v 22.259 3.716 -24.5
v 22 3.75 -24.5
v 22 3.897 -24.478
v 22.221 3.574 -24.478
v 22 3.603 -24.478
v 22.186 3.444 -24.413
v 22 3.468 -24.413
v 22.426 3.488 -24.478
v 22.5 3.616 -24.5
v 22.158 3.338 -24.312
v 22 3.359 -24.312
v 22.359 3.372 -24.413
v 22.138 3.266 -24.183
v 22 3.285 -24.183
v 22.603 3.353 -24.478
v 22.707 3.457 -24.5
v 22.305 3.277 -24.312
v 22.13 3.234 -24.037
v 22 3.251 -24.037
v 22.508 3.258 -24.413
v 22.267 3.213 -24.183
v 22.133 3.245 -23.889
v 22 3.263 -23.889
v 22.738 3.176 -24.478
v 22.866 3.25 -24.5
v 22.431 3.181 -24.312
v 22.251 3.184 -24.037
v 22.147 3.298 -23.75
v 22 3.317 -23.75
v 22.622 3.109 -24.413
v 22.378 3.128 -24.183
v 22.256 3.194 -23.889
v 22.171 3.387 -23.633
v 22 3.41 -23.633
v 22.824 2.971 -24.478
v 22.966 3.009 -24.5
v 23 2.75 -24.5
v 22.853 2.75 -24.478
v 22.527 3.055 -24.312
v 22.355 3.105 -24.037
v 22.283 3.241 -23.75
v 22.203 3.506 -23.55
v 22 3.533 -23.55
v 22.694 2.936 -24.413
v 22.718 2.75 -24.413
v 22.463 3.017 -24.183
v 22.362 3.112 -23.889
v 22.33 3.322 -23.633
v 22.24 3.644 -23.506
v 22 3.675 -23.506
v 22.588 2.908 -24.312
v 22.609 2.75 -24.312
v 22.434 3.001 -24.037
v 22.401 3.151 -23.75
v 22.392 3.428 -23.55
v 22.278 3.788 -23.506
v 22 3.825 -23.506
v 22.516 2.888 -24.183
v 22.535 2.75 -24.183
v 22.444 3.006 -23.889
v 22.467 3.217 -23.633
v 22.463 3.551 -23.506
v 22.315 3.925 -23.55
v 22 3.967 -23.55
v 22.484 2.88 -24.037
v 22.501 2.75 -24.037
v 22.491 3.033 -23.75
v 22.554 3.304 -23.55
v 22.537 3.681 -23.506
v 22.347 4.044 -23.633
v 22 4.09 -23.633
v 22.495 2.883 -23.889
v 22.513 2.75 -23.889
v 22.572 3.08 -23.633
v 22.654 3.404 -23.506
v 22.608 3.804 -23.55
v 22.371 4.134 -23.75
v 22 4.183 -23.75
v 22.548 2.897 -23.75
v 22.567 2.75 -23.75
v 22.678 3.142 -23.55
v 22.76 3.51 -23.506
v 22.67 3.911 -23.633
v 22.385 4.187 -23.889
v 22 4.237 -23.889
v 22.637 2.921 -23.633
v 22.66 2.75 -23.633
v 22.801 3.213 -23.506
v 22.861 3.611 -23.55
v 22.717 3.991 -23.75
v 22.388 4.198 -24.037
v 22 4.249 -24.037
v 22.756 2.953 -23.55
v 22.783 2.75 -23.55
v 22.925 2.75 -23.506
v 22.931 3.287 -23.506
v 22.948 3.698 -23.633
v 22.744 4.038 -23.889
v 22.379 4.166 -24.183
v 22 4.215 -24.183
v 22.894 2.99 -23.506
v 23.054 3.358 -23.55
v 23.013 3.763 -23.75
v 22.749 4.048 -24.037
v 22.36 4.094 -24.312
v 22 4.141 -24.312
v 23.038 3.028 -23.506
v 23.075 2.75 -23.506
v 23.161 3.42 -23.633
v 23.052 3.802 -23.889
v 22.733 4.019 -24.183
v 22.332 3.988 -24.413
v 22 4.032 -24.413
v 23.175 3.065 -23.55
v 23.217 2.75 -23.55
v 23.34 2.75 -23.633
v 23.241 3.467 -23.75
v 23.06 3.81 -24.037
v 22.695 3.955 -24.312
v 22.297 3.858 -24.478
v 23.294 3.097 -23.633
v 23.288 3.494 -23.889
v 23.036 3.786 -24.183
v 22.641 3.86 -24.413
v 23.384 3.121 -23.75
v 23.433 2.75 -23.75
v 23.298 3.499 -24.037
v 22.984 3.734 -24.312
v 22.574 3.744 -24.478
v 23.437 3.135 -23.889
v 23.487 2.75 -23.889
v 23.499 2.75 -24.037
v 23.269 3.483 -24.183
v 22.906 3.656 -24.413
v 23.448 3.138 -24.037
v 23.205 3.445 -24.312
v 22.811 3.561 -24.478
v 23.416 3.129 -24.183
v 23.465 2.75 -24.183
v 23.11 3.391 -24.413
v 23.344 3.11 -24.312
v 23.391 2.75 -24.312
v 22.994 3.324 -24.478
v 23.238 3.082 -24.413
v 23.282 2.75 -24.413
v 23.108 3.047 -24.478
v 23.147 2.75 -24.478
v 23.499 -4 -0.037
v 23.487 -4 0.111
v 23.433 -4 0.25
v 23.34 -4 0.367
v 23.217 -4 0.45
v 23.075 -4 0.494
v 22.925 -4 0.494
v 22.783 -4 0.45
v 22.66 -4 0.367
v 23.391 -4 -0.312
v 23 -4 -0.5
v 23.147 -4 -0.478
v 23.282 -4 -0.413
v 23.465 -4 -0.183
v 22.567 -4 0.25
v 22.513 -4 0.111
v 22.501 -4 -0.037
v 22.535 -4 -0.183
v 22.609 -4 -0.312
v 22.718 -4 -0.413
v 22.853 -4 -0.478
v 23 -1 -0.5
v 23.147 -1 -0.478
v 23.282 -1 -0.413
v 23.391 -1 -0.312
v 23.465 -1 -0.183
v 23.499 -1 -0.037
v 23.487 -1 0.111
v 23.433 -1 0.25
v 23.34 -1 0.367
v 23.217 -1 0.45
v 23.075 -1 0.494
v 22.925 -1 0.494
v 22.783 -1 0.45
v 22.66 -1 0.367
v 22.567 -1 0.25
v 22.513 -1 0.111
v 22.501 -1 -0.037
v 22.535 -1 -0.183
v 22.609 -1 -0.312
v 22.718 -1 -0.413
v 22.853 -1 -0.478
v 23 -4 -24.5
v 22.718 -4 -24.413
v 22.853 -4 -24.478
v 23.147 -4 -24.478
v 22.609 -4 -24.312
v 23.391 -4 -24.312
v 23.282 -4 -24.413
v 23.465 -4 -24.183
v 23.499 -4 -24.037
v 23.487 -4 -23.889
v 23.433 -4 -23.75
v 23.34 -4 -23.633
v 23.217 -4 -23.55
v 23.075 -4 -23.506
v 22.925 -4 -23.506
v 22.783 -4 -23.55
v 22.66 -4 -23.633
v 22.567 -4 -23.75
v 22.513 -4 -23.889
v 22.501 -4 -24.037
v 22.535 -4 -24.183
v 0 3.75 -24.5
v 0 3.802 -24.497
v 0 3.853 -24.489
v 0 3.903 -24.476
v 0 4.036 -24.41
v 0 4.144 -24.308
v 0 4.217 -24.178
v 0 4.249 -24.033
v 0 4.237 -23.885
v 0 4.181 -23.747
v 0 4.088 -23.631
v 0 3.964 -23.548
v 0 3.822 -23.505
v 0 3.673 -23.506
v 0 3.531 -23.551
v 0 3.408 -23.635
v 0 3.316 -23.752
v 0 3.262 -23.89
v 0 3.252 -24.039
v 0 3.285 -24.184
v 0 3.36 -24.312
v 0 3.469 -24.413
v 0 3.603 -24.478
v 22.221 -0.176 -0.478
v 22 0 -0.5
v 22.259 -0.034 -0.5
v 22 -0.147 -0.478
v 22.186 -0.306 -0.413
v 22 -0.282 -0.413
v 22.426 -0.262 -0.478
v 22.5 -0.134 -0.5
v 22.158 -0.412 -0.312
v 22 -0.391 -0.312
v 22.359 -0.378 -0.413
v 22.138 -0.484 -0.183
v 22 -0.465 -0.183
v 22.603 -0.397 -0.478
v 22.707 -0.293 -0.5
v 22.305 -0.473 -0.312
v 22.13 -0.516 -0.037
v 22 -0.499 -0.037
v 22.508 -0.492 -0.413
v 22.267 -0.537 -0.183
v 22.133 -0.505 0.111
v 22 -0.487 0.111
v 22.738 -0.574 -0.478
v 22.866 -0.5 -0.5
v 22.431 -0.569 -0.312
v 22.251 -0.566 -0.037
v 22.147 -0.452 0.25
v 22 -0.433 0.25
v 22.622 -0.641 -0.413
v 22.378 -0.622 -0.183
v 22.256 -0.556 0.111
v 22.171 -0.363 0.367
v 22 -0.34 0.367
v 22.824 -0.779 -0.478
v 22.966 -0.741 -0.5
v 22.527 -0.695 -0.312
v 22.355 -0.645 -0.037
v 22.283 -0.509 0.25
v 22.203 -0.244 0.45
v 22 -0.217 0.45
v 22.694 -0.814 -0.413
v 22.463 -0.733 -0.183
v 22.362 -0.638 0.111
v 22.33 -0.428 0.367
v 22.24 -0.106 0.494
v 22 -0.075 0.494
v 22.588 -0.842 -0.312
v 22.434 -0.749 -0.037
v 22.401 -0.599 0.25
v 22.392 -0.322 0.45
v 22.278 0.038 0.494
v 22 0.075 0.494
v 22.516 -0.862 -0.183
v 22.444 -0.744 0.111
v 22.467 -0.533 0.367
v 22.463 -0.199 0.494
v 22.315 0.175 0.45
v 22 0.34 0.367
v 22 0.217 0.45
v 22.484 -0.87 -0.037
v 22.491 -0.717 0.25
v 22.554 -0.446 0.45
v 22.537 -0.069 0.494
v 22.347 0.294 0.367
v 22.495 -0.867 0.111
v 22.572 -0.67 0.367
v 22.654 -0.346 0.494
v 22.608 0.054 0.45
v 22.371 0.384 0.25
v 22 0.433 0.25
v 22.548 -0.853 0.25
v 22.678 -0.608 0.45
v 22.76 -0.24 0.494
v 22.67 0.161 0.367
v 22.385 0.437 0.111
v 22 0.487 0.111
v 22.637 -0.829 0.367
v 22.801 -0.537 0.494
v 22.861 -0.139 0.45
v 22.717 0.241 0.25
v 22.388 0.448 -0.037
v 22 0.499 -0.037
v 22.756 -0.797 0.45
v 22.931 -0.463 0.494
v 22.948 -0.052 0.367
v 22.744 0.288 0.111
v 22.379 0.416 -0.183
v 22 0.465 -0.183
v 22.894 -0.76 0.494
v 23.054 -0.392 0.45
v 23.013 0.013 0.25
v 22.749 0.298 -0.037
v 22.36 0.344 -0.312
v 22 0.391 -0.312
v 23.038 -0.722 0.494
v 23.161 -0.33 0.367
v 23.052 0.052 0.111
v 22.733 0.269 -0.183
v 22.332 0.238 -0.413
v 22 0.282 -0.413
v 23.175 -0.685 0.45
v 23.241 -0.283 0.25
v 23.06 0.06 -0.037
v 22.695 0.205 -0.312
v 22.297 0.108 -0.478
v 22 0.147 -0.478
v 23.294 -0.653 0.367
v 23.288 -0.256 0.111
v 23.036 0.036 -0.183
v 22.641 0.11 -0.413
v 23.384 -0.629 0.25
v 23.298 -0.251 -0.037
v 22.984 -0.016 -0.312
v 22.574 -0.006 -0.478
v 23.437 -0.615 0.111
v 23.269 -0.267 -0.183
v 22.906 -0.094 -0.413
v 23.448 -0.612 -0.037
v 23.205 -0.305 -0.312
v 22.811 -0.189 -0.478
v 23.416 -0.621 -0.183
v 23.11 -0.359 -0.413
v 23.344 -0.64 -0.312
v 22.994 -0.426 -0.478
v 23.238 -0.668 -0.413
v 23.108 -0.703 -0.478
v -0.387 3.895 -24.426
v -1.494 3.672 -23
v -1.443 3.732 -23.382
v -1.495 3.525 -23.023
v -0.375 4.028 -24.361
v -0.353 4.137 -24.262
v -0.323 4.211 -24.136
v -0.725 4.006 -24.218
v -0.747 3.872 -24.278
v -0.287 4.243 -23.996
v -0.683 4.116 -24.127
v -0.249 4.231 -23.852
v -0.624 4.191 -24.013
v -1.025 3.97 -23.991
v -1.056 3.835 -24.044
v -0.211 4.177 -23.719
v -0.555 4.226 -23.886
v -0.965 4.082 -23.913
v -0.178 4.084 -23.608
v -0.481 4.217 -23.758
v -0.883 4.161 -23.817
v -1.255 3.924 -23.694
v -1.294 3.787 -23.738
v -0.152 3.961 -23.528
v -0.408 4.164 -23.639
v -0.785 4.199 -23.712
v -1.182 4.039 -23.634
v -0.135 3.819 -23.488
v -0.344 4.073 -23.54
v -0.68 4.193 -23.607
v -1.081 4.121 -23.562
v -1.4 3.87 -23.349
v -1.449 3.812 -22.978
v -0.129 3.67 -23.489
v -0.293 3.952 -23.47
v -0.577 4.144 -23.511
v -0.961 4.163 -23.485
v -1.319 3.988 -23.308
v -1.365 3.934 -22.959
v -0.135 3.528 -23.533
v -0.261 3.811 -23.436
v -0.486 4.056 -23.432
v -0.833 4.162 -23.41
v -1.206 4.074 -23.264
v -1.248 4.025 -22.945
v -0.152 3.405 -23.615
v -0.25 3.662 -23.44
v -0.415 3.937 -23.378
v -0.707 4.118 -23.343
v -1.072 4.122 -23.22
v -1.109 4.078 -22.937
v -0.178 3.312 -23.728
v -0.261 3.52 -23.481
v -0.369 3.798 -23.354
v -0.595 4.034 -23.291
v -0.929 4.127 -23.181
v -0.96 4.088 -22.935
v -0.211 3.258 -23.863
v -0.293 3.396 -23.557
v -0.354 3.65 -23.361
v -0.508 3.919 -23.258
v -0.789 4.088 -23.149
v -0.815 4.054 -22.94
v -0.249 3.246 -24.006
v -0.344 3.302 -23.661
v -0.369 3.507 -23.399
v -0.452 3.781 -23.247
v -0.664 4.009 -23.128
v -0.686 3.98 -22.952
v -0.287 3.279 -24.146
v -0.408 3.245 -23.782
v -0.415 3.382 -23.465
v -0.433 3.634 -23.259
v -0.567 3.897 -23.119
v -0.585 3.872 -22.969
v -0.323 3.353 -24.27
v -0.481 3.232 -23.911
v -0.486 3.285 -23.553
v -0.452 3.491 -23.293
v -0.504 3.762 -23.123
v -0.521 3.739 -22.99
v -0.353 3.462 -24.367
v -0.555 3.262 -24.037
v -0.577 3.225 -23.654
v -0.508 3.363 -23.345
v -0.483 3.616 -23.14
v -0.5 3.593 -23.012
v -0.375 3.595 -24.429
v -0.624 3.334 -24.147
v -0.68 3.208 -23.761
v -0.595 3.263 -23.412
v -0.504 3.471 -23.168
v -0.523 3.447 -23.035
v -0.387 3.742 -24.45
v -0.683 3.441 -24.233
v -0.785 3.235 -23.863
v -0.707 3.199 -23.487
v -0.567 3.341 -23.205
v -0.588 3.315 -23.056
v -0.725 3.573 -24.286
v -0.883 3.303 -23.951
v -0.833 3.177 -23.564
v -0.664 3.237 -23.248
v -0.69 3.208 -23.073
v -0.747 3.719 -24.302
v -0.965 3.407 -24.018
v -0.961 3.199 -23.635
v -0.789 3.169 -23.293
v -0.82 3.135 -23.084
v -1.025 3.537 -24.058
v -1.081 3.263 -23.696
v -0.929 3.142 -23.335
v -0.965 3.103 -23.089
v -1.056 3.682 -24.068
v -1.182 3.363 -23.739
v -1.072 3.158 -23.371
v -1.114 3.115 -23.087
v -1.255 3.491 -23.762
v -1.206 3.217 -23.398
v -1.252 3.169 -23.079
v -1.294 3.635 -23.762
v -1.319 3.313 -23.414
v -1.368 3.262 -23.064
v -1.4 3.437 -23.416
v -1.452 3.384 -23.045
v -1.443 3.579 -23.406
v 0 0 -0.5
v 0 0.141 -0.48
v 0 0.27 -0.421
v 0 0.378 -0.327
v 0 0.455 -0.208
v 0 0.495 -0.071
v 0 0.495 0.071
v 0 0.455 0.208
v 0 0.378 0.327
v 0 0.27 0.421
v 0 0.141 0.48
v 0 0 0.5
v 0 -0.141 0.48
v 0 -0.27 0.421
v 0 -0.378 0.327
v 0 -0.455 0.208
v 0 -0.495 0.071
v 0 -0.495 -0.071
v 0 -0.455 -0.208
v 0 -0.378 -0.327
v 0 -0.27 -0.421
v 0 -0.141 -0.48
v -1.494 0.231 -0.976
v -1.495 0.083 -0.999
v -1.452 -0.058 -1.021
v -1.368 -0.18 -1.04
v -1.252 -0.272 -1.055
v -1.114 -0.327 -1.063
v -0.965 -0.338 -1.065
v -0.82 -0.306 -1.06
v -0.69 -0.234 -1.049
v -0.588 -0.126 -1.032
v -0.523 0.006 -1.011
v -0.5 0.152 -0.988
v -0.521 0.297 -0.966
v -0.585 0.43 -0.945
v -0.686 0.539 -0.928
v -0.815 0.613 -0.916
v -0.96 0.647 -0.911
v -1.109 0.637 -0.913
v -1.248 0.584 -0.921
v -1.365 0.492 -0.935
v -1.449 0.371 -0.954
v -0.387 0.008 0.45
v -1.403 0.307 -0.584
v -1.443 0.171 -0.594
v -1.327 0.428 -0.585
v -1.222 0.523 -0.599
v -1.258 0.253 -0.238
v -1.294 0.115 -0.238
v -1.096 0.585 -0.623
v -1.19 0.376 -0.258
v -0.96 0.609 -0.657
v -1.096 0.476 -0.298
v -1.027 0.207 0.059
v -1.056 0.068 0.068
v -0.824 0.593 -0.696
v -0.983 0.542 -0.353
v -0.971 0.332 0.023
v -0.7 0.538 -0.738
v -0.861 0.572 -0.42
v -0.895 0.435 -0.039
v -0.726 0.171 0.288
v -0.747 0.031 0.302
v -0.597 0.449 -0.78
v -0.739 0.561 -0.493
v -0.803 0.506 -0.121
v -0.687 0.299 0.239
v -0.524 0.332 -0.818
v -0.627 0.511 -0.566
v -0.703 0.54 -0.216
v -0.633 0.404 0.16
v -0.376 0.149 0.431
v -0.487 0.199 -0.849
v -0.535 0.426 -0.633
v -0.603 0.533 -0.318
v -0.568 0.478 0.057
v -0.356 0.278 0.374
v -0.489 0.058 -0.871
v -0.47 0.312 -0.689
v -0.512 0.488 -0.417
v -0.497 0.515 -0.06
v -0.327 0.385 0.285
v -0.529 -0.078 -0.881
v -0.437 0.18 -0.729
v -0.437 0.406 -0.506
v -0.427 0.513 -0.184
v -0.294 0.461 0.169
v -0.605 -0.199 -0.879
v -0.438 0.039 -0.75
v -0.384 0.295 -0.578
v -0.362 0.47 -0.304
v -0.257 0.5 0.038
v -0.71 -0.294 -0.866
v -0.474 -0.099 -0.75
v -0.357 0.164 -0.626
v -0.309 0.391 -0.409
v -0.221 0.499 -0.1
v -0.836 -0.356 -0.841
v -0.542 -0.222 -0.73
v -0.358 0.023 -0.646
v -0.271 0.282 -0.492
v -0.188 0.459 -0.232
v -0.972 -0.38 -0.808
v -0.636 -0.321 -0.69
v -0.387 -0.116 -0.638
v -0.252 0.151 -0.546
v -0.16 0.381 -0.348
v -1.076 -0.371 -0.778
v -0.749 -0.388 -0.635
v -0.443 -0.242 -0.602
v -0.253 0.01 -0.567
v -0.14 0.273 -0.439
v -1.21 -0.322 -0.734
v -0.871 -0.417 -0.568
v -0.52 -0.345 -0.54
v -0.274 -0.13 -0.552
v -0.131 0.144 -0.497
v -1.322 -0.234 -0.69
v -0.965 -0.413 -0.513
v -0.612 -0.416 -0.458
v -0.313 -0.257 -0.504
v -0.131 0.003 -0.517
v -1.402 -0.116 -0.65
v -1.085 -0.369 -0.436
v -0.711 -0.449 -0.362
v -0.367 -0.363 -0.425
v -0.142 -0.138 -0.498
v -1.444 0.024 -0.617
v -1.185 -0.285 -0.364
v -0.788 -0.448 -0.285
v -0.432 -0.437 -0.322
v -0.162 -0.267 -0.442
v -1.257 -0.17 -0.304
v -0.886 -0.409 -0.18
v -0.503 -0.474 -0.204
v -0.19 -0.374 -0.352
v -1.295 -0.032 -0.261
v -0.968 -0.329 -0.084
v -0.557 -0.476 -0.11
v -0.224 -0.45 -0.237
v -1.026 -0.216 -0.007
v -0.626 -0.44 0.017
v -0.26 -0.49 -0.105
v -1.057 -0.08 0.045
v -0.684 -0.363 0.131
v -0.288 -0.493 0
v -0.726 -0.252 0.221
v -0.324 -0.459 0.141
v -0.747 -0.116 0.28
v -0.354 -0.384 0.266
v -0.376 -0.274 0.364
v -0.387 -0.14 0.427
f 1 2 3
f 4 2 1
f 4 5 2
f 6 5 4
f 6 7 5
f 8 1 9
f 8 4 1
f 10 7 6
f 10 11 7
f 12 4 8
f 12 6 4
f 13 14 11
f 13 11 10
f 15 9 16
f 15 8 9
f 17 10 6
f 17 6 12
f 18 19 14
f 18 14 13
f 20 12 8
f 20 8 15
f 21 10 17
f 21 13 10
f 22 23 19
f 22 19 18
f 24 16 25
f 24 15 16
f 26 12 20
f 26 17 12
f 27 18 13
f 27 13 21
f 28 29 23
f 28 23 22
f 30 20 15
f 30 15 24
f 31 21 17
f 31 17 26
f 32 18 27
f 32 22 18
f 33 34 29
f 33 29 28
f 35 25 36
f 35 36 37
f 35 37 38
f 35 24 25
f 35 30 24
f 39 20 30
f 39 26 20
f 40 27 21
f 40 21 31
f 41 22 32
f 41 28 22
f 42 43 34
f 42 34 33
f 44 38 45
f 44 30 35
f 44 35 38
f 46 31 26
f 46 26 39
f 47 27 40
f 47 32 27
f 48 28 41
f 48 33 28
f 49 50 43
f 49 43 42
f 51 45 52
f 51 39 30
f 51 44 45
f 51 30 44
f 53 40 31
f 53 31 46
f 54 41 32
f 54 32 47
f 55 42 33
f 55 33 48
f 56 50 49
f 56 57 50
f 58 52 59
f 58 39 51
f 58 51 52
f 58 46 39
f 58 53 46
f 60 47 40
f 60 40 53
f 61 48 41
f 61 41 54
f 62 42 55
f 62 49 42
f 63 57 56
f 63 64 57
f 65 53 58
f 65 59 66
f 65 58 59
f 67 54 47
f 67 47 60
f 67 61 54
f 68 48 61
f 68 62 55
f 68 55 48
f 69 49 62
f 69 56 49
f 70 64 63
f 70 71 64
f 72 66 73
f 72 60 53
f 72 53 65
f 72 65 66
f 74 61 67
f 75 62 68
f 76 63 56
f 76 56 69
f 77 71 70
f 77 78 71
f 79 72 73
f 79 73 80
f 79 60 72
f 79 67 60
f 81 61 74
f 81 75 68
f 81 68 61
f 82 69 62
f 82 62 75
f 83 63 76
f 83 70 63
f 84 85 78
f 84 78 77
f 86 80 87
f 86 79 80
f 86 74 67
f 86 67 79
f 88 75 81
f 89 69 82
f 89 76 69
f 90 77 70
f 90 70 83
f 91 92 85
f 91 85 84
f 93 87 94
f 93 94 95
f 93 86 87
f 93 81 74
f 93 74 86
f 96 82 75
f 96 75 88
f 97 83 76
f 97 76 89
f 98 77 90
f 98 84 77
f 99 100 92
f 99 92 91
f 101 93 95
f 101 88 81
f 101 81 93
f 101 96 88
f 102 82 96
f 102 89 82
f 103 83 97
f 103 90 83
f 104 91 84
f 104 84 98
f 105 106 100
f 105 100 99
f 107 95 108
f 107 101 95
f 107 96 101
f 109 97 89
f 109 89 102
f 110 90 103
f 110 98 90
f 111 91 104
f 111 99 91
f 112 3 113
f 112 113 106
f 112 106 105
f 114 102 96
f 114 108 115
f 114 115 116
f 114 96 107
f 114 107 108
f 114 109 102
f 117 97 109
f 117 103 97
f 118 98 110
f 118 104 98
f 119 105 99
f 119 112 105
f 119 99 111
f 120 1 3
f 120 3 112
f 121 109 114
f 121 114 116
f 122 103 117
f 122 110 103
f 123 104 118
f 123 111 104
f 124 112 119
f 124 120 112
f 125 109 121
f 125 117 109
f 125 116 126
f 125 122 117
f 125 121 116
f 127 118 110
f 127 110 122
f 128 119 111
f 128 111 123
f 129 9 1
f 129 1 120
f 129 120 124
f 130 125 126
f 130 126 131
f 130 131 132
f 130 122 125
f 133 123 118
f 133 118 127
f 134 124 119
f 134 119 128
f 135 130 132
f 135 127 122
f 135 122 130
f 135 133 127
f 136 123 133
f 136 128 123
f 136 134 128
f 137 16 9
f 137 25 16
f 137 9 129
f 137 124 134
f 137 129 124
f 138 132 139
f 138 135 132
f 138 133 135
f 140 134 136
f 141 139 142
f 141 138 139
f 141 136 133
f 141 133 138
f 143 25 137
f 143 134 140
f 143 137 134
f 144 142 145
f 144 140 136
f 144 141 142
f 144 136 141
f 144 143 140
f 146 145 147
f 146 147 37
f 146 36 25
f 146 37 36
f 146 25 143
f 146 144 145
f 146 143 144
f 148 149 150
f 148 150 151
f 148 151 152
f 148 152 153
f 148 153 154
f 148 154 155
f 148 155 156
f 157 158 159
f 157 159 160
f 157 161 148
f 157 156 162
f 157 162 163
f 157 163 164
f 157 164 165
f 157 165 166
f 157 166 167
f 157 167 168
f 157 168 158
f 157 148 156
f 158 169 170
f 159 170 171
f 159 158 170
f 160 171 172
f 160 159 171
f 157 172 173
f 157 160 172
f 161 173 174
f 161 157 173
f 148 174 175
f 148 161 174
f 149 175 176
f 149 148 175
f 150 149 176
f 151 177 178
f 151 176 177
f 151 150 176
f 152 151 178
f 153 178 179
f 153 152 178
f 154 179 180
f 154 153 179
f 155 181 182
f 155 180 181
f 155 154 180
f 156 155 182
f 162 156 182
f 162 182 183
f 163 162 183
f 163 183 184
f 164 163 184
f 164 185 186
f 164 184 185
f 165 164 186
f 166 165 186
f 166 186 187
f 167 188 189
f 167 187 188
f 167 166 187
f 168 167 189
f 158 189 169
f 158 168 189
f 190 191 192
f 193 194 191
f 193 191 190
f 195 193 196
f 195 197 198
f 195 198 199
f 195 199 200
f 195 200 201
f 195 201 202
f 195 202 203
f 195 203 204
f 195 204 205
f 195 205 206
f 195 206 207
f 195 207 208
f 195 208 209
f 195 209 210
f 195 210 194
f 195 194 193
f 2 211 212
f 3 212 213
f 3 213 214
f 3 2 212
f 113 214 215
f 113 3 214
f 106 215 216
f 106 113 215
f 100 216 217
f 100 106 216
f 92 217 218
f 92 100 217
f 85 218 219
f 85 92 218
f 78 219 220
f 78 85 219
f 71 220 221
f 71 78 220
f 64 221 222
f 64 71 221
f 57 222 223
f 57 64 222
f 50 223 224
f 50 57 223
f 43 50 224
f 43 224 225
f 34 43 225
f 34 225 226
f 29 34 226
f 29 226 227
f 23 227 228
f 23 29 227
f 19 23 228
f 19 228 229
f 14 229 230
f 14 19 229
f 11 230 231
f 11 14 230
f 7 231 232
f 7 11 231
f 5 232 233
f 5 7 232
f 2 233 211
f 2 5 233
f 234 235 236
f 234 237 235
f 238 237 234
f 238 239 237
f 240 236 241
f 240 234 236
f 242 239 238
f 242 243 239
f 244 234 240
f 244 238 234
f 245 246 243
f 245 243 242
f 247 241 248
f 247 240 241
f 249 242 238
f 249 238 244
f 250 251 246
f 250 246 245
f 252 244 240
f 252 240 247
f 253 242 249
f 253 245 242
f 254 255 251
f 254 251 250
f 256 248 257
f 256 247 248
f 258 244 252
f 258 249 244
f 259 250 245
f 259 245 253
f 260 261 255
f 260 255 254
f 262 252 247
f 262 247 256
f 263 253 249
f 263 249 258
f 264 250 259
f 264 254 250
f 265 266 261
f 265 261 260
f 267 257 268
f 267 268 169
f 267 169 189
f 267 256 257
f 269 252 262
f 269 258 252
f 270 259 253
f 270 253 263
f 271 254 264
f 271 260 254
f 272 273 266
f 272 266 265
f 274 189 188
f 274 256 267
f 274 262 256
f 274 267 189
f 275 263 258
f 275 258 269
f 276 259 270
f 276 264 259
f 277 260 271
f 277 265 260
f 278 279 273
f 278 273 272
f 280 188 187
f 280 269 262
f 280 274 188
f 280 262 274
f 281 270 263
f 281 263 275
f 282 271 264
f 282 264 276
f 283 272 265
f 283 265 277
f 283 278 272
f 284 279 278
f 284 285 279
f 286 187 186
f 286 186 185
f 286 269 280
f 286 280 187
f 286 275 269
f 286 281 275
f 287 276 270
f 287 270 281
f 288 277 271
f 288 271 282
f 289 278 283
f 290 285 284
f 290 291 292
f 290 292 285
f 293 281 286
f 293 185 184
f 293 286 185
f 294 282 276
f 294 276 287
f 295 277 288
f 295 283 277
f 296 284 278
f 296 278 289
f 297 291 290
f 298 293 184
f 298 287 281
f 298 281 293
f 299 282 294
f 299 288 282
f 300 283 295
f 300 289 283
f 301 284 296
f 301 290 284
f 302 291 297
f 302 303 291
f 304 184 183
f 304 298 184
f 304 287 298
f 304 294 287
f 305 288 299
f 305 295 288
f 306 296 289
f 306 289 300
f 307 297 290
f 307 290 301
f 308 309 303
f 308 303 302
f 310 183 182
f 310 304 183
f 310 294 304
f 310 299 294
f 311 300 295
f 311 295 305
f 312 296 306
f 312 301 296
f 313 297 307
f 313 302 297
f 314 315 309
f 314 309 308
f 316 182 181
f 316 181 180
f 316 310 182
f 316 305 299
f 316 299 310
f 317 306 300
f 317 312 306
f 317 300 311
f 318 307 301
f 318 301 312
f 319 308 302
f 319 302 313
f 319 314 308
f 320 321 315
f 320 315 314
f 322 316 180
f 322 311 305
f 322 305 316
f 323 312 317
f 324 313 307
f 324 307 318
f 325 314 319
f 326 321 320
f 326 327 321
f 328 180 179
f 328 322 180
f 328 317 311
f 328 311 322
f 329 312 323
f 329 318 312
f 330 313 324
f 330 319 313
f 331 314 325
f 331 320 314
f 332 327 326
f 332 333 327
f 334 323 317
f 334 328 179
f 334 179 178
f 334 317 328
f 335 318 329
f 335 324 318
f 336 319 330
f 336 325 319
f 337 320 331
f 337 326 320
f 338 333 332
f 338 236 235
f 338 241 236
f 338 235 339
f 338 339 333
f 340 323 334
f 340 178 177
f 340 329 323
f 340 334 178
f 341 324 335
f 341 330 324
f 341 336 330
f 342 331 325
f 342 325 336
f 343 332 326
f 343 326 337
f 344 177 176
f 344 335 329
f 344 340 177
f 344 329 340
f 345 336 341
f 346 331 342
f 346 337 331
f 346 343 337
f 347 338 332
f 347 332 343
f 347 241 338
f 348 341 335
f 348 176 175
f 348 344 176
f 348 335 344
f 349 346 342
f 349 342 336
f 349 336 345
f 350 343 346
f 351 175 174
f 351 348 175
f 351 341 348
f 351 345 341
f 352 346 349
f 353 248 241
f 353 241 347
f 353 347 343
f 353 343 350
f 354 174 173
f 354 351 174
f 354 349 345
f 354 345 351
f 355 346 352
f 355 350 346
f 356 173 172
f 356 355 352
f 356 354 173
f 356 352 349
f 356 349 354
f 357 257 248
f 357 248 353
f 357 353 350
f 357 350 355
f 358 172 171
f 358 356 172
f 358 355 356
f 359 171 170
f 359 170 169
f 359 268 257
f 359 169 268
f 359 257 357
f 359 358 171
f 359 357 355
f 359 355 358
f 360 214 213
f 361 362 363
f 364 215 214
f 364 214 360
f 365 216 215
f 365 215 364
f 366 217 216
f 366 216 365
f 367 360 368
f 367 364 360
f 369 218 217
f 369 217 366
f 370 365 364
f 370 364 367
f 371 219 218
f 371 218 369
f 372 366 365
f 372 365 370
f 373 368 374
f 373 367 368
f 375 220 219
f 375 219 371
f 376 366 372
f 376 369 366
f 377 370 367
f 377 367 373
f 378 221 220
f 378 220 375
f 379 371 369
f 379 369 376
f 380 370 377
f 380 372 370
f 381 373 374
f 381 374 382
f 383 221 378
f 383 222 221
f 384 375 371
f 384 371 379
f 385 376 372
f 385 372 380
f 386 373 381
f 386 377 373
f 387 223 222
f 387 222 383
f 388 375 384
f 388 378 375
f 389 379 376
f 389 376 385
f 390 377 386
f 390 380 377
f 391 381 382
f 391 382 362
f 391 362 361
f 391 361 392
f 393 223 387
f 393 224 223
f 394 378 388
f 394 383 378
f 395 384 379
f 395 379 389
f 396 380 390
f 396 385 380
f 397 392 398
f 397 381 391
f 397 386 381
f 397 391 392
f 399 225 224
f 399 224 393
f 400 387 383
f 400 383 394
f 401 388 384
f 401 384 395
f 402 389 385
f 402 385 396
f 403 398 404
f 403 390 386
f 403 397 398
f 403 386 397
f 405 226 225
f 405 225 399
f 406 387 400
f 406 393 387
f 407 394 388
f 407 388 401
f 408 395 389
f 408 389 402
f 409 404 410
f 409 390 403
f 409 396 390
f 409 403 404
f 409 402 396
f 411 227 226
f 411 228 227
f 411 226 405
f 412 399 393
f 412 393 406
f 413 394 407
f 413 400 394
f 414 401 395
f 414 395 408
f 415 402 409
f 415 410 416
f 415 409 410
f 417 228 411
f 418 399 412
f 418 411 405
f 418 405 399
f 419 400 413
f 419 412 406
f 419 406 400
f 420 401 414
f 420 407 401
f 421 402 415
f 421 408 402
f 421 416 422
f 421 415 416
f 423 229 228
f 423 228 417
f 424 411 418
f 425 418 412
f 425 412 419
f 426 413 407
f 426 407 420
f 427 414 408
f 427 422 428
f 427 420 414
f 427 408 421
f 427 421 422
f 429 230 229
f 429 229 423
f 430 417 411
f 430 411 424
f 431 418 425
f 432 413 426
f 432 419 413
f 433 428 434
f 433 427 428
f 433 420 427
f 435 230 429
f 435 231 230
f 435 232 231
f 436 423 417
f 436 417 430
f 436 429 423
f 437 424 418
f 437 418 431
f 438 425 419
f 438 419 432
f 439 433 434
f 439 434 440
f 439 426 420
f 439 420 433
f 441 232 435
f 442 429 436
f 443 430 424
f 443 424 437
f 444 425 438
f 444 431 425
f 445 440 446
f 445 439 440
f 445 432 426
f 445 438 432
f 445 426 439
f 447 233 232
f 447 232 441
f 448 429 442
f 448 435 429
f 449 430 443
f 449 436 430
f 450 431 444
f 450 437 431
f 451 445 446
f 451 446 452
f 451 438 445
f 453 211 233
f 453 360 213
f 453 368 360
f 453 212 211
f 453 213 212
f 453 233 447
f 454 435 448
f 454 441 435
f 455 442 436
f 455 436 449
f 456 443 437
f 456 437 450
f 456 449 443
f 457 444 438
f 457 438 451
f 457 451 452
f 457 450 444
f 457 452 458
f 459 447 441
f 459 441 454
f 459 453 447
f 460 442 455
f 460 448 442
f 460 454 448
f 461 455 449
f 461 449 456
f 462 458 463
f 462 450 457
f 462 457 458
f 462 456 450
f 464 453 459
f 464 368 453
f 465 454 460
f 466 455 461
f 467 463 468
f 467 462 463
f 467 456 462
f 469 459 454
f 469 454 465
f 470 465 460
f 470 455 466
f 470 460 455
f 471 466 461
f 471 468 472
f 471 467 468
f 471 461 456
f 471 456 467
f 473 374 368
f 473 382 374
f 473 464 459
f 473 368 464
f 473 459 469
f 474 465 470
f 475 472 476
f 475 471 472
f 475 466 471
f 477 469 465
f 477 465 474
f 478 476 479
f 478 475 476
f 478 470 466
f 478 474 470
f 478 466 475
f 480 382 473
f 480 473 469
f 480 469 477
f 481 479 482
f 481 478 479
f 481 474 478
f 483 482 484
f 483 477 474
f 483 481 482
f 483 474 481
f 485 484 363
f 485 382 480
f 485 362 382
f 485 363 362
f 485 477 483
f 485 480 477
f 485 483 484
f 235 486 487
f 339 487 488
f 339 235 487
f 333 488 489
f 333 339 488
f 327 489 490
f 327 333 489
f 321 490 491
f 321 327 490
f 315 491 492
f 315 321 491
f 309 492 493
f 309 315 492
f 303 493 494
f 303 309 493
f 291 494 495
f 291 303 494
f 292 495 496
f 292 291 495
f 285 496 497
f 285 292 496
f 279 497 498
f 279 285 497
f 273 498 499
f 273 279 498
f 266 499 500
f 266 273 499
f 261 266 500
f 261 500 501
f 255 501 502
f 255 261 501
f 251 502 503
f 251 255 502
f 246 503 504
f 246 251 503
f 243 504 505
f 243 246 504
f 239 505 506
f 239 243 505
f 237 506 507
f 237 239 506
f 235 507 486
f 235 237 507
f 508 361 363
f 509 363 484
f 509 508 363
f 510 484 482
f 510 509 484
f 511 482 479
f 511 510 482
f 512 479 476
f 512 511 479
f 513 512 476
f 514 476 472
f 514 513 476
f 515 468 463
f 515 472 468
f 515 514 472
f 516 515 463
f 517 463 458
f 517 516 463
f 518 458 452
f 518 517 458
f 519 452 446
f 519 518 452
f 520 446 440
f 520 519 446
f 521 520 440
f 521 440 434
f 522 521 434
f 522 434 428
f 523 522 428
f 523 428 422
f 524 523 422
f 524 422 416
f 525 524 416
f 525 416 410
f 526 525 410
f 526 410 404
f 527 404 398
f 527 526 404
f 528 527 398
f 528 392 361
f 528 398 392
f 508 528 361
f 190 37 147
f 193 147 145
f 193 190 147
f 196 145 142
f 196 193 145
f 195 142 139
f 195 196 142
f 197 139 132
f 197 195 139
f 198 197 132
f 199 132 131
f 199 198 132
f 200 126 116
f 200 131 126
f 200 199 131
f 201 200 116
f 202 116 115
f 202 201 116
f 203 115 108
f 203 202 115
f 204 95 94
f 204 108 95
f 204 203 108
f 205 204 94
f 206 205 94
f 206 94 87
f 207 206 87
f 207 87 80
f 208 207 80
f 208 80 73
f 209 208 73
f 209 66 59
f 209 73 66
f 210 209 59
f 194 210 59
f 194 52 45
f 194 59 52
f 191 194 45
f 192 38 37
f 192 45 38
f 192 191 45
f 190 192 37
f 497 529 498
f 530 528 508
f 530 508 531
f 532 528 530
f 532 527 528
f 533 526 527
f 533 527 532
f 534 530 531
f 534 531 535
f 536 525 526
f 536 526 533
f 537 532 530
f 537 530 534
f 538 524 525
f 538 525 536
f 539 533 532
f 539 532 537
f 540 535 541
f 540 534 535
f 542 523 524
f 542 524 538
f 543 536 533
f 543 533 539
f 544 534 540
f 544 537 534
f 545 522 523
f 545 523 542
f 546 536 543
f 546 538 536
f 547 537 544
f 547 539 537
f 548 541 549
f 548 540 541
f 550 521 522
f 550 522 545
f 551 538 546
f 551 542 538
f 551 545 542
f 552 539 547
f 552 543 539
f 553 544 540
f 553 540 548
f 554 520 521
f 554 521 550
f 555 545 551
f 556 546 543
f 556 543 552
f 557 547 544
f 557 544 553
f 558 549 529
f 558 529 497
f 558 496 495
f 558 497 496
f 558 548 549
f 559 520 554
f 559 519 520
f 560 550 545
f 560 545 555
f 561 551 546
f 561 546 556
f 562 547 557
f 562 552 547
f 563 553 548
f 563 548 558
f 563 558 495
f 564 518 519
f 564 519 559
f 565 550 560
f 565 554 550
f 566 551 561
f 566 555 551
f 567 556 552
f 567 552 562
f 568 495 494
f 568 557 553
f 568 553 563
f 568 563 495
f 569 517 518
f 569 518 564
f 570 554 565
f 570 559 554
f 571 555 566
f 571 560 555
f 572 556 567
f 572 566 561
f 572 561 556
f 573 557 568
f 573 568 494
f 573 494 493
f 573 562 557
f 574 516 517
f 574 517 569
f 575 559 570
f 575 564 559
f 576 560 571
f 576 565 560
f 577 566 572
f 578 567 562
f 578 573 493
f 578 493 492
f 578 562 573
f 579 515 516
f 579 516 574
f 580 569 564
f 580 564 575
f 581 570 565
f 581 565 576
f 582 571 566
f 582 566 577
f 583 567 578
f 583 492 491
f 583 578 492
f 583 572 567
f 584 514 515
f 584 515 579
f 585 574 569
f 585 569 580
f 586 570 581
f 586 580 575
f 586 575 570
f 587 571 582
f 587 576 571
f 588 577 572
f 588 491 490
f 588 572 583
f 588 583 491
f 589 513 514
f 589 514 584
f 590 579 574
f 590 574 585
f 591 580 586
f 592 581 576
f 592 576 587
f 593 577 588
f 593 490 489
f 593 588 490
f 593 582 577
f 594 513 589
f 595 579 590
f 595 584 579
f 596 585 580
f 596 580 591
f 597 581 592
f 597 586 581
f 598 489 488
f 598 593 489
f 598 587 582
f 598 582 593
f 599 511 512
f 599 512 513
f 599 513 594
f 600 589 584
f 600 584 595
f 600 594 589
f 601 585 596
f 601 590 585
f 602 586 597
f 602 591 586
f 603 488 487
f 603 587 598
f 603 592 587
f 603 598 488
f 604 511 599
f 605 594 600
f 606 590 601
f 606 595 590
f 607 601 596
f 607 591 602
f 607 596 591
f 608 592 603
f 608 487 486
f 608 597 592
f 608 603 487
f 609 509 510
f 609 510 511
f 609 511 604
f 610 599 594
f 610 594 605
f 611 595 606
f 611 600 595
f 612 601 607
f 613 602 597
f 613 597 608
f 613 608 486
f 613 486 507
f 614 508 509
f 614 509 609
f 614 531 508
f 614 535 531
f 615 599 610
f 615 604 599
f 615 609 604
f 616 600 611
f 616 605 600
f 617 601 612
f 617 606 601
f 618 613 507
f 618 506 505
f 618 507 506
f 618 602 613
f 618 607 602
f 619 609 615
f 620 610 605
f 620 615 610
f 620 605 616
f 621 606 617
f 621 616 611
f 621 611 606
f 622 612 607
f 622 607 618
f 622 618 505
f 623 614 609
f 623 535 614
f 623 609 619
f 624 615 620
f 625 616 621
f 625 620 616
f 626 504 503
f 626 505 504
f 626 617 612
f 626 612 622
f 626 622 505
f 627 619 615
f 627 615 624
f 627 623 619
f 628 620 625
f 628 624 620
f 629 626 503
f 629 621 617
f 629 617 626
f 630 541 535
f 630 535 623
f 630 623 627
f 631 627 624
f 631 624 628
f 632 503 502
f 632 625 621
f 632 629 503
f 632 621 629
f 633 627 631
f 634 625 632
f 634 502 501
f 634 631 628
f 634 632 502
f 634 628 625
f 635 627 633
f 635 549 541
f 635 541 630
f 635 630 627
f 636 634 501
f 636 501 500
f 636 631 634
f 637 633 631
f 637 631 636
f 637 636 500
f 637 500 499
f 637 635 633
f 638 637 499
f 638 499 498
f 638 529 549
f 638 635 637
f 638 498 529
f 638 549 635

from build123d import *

# Parameters (mm, degrees)
SKETCH4_R = 0.5
SKETCH5_R = 0.5
SKETCH6_R = 0.5


with BuildPart() as part:
    # Sweep1: sweep along a path in Sketch1
    with BuildLine(Plane.XY) as sweep1_path:
        Line((0, 0), (22, 0))
        ThreePointArc((22, 0), (22.707106781, -0.292893219), (23, -1))
        Line((23, -1), (23, -4))
    # Sketch4 → Sweep1 (sweep)
    with BuildSketch(Plane(origin=(0, 0, 0), x_dir=(0, 0, -1), z_dir=(1, 0, 0))):
        Circle(SKETCH4_R)
    sweep(path=sweep1_path.line)

    # Sweep2: sweep along a path in Sketch3
    with BuildLine(Plane(origin=(0, 0, 0), x_dir=(-1, 0, 0), z_dir=(0, 0.988012034, 0.15437688))) as sweep2_path:
        ThreePointArc((0, -24.291202111), (0.707106781, -23.998308892), (1, -23.291202111))
        Line((1, -23.291202111), (1, -1))
        ThreePointArc((1, -1), (0.707106781, -0.292893219), (0, 0))
    # Sketch5 → Sweep2 (sweep)
    with BuildSketch(Plane.ZY):
        Circle(SKETCH5_R)
    sweep(path=sweep2_path.line)

    # Sweep3: sweep along a path in Sketch2
    with BuildLine(Plane.XY.offset(-24)) as sweep3_path:
        Line((0, 3.75), (22, 3.75))
        ThreePointArc((22, 3.75), (22.707106781, 3.457106781), (23, 2.75))
        Line((23, 2.75), (23, -4))
    # Sketch6 → Sweep3 (sweep)
    with BuildSketch(Plane(origin=(0, 0, 0), x_dir=(0, 0, -1), z_dir=(1, 0, 0))):
        with Locations((24, 3.75)):
            Circle(SKETCH6_R)
    sweep(path=sweep3_path.line)


solid = part.part
